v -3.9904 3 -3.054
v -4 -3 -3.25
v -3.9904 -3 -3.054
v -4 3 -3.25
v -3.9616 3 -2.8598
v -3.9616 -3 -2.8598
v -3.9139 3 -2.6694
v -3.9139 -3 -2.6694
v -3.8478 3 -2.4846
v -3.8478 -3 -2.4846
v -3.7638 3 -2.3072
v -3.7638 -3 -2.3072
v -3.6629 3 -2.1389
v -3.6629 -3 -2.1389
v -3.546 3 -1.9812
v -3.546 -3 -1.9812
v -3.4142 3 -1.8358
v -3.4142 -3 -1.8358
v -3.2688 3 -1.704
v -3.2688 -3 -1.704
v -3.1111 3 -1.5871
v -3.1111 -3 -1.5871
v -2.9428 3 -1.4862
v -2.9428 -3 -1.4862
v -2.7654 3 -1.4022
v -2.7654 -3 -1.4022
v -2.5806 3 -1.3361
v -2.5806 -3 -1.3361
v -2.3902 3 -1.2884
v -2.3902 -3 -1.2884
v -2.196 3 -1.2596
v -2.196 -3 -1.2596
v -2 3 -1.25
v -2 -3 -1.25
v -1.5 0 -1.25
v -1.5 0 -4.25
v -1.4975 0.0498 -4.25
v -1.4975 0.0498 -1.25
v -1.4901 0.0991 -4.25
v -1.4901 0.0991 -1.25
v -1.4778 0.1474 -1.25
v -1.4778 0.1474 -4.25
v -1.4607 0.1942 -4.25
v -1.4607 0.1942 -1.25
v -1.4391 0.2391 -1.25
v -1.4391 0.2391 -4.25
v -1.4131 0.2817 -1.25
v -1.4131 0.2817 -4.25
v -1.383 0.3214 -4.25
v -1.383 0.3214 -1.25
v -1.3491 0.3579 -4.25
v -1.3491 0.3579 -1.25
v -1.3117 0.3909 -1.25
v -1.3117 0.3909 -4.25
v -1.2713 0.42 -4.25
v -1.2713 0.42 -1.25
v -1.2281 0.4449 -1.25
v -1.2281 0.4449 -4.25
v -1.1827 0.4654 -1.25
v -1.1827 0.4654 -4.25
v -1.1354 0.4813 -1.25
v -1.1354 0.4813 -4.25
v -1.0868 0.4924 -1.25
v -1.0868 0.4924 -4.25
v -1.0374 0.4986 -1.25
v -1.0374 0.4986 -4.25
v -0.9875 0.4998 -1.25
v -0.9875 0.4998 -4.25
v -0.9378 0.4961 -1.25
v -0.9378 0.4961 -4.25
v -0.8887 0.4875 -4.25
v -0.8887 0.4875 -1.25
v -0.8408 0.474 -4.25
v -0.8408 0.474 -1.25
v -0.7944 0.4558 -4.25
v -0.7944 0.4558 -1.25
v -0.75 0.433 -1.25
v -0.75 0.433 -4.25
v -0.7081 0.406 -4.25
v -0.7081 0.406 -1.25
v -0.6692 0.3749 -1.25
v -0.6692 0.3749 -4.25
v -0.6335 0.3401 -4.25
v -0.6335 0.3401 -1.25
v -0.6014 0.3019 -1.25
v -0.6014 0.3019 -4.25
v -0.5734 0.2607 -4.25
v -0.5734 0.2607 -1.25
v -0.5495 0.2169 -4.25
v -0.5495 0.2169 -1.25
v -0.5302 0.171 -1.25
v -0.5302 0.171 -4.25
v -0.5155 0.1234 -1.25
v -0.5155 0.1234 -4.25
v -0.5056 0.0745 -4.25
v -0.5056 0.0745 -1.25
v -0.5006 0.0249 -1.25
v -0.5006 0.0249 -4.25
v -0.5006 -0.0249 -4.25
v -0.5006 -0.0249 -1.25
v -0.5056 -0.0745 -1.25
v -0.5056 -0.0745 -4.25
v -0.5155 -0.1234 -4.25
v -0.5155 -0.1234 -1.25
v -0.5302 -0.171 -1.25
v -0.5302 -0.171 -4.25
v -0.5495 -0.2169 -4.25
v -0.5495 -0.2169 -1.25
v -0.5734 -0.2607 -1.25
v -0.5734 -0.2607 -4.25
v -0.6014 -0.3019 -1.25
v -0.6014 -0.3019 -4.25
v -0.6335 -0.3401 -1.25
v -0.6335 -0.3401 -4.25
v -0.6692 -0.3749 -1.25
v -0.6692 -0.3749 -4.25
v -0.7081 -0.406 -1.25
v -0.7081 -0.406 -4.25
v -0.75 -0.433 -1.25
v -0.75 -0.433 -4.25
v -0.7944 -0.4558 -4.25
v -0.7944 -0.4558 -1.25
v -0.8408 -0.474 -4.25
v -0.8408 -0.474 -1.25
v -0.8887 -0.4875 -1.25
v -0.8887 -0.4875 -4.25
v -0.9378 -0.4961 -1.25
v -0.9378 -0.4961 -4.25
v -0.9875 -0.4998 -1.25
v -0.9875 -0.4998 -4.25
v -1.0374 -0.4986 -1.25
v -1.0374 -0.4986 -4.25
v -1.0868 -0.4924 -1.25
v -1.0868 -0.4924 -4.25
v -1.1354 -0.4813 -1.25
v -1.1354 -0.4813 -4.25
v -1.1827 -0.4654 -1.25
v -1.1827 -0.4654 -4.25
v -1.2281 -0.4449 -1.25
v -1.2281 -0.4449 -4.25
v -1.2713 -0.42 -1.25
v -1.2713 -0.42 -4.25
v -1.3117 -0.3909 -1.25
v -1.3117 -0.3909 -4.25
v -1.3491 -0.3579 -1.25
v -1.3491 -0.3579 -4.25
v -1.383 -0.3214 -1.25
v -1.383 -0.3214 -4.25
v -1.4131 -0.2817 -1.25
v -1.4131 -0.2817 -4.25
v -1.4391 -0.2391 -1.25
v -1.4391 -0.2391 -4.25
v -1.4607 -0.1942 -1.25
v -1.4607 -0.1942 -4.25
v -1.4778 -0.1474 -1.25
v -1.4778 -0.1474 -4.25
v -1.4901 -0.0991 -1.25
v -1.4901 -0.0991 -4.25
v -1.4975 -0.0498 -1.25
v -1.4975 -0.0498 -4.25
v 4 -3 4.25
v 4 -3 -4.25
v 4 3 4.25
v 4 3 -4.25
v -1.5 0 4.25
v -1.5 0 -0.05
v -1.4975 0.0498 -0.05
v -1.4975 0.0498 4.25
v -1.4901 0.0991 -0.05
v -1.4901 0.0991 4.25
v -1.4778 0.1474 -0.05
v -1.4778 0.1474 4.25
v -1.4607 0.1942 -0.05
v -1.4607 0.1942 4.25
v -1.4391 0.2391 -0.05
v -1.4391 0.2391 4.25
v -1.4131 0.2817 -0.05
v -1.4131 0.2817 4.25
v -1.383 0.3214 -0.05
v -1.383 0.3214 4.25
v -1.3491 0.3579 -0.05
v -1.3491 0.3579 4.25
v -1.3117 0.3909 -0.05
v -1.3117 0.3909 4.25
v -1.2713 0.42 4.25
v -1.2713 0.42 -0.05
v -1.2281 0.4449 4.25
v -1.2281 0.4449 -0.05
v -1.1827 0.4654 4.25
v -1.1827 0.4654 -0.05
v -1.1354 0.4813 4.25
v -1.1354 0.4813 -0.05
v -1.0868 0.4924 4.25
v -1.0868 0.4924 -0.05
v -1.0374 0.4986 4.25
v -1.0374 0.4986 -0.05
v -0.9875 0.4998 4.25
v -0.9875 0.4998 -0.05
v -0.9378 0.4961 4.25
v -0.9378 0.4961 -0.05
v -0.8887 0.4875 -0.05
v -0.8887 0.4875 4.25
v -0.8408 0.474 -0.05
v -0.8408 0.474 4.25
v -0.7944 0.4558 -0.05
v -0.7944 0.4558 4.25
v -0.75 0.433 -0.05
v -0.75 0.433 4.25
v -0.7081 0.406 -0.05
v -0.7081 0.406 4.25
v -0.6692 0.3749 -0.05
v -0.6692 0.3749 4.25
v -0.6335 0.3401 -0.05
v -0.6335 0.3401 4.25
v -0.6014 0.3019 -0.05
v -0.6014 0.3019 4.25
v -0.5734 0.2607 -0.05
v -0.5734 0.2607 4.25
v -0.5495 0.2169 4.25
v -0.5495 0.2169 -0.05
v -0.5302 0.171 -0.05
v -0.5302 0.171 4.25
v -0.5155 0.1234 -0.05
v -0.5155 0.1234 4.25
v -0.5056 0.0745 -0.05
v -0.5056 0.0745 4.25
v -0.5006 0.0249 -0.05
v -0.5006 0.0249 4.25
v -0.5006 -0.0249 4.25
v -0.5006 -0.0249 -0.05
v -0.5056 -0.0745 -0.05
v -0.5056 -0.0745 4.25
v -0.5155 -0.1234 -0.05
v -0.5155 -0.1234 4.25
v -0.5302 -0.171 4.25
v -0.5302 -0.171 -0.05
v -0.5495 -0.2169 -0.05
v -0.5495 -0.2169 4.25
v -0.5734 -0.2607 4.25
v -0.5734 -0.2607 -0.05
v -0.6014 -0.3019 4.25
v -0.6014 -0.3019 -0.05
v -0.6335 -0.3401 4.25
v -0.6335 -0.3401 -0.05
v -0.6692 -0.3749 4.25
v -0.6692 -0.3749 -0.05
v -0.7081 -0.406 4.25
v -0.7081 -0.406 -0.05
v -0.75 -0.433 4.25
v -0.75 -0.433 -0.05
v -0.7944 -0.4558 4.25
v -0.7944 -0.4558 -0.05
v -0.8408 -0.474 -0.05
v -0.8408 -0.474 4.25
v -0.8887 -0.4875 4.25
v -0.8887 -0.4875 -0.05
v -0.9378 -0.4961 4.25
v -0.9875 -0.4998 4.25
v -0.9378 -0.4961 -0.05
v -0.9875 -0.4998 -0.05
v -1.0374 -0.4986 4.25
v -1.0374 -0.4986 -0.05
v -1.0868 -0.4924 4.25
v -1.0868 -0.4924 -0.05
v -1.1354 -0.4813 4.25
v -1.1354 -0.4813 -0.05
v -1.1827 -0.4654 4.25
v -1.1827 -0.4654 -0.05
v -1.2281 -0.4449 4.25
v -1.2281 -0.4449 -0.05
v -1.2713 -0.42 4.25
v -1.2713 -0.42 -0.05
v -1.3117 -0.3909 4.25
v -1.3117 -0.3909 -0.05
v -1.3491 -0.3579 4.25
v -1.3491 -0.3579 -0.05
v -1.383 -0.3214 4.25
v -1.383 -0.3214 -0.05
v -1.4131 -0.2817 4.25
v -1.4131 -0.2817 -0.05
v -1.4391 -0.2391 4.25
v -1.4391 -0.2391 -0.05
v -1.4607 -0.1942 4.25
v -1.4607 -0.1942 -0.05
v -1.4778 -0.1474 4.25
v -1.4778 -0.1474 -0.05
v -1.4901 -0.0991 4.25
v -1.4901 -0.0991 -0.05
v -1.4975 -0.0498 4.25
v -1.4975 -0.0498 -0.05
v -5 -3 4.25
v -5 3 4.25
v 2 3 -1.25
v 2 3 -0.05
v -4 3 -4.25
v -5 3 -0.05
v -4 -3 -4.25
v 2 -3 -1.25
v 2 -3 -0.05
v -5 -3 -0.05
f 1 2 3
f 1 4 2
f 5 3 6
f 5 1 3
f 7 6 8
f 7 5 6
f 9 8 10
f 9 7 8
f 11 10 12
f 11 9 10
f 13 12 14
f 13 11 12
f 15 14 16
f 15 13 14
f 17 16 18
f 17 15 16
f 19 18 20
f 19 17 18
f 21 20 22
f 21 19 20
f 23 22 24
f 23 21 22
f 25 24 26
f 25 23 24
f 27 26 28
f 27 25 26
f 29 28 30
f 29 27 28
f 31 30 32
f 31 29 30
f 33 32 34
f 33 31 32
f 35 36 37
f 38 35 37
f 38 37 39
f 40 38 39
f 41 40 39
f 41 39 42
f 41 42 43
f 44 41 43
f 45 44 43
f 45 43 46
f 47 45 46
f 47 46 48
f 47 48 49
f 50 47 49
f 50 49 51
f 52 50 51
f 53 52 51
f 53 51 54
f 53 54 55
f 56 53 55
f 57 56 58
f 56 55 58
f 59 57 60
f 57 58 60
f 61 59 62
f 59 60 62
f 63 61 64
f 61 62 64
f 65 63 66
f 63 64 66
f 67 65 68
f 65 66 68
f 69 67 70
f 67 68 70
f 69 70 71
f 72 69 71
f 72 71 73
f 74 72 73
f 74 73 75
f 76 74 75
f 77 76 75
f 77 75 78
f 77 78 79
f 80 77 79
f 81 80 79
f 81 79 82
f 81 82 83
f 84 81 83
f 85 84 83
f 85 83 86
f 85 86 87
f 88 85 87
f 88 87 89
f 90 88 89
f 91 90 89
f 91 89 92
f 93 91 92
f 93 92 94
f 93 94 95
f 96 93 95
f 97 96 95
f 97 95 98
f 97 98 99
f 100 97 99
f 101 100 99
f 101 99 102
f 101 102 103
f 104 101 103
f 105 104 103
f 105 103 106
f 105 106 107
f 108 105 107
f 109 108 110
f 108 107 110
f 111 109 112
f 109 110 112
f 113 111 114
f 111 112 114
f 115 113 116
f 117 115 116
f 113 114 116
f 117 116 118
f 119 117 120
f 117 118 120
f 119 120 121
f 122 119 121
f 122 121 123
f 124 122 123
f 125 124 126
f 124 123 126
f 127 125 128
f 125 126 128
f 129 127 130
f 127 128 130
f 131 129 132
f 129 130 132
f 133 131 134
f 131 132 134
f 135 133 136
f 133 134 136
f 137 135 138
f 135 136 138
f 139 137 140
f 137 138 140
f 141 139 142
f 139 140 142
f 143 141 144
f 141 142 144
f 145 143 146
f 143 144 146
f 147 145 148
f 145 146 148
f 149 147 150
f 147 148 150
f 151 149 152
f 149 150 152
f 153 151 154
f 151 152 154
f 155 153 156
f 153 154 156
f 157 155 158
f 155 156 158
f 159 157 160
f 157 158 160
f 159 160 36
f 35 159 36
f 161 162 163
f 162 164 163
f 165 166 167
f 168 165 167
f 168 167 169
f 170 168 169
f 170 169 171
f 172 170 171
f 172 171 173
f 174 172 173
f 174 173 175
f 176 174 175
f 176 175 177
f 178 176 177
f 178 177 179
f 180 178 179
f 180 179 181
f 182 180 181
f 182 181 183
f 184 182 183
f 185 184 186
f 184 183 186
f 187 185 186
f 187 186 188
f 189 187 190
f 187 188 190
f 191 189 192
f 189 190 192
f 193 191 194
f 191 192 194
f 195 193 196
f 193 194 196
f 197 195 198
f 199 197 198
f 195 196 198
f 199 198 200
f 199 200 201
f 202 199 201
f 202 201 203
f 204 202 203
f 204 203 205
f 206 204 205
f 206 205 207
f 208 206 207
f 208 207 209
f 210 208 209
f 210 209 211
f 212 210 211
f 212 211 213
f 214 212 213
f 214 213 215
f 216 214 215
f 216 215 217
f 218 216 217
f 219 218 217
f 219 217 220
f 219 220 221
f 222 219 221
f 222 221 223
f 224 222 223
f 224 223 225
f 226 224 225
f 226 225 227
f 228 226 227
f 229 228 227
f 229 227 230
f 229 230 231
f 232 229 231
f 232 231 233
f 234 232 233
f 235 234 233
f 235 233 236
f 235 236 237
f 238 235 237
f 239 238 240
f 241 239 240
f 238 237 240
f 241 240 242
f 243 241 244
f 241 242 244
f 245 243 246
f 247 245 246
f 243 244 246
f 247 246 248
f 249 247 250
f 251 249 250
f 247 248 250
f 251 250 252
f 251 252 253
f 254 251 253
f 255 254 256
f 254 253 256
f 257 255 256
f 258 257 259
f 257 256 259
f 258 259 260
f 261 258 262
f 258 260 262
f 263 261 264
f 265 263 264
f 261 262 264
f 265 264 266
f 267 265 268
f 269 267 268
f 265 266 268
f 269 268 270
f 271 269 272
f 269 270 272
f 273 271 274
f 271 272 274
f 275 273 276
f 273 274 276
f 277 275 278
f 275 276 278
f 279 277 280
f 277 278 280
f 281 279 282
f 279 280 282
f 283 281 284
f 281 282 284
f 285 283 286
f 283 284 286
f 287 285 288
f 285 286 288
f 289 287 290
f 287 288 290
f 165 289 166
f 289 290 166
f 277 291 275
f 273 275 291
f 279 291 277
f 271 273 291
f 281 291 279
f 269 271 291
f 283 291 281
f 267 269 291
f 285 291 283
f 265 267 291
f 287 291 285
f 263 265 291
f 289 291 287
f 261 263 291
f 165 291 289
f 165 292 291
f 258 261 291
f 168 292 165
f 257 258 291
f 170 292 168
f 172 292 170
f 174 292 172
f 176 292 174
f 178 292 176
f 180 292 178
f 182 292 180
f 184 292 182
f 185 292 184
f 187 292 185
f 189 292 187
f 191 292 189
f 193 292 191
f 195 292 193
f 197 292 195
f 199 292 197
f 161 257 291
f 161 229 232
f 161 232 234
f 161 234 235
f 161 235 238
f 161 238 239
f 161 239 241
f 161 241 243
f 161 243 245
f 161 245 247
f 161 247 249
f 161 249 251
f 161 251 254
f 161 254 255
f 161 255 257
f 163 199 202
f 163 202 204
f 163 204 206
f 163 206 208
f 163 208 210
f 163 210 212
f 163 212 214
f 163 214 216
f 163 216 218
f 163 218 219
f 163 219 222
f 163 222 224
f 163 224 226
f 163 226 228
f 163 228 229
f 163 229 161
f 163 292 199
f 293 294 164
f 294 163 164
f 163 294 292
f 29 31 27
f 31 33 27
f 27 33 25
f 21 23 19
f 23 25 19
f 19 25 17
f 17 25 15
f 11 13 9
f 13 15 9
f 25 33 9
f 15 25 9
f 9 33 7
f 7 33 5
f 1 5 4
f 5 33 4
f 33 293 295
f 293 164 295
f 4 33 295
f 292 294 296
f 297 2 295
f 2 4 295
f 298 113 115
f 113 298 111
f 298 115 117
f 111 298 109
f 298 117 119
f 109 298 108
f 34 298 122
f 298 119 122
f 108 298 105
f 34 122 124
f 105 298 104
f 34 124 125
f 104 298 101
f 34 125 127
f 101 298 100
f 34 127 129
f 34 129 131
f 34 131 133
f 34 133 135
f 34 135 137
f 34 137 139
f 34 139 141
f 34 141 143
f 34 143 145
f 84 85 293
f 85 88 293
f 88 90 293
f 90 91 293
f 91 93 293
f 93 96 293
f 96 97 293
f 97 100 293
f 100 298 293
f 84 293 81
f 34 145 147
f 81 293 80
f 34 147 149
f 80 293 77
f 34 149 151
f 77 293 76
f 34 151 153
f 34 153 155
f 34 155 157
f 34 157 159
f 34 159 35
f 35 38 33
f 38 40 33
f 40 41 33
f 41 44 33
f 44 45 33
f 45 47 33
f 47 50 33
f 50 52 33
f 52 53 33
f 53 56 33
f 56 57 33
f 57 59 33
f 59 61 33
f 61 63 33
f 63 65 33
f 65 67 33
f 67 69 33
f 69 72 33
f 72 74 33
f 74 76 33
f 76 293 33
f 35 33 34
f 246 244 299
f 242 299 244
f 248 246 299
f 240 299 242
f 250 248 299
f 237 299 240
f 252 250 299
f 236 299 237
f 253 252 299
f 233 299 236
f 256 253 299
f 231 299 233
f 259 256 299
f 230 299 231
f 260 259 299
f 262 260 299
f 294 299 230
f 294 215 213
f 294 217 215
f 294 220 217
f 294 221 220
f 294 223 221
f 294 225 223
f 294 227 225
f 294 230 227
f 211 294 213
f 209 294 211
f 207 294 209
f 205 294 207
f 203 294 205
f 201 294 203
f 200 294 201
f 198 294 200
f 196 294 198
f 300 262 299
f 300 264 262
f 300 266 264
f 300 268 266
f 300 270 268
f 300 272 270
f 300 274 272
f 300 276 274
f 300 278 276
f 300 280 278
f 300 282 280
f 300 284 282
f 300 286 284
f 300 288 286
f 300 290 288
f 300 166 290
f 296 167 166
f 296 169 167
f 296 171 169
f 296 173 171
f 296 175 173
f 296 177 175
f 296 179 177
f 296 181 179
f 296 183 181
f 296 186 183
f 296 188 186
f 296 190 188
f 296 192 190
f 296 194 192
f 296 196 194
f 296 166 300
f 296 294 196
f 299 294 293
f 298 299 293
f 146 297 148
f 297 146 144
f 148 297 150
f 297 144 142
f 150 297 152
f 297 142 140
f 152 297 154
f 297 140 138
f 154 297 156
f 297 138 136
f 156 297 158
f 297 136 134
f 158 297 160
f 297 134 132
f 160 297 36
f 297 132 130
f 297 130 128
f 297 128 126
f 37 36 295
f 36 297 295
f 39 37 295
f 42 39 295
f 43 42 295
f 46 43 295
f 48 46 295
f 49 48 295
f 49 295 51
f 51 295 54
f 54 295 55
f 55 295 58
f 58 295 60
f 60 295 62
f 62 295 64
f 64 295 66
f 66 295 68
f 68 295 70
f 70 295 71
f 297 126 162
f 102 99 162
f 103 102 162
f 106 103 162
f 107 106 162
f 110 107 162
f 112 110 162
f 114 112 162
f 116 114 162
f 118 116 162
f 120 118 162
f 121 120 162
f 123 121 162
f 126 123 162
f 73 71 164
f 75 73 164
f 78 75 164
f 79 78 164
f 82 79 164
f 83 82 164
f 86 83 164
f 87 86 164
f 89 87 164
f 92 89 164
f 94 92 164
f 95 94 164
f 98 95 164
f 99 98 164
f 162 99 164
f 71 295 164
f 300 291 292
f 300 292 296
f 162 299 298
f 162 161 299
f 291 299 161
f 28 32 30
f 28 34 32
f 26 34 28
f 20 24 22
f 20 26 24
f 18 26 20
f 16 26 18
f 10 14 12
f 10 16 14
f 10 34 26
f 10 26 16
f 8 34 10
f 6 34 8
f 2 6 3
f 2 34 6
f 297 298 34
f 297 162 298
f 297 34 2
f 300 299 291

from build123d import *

# Parameters (mm, degrees)
BOSS_EXTRU_1_DEPTH      = 3
ESQUISSE3_R             = 0.5
ENL_V_MAT_EXTRU_1_DEPTH = 9.5
CONG_1_R                = 2


with BuildPart() as part:
    # Esquisse2 → Boss.-Extru.1 (new body, symmetric)
    with BuildSketch(Plane(origin=(0, 0, 0), x_dir=(1, 0, 0), z_dir=(0, 1, 0))):
        Polygon((-4, 1.25), (-4, 4.25), (4, 4.25), (4, -4.25), (-4, -4.25), (-5, -4.25), (-5, 0.05), (-4, 0.05), (2, 0.05), (2, 1.25), align=None)
    extrude(amount=BOSS_EXTRU_1_DEPTH, both=True)

    # Esquisse3 → Enlèv. mat.-Extru.1 (cut, through all)
    with BuildSketch(Plane(origin=(0, 0, -4.25), x_dir=(-1, 0, 0), z_dir=(0, 0, -1))):
        with Locations((1, 0)):
            Circle(ESQUISSE3_R)
    extrude(amount=-ENL_V_MAT_EXTRU_1_DEPTH, mode=Mode.SUBTRACT)

    # Congé1
    cong_1_edges = [part.edges().sort_by_distance(p)[0] for p in [
        (-4, 0, -1.25),
    ]]
    fillet(cong_1_edges, radius=CONG_1_R)


solid = part.part
